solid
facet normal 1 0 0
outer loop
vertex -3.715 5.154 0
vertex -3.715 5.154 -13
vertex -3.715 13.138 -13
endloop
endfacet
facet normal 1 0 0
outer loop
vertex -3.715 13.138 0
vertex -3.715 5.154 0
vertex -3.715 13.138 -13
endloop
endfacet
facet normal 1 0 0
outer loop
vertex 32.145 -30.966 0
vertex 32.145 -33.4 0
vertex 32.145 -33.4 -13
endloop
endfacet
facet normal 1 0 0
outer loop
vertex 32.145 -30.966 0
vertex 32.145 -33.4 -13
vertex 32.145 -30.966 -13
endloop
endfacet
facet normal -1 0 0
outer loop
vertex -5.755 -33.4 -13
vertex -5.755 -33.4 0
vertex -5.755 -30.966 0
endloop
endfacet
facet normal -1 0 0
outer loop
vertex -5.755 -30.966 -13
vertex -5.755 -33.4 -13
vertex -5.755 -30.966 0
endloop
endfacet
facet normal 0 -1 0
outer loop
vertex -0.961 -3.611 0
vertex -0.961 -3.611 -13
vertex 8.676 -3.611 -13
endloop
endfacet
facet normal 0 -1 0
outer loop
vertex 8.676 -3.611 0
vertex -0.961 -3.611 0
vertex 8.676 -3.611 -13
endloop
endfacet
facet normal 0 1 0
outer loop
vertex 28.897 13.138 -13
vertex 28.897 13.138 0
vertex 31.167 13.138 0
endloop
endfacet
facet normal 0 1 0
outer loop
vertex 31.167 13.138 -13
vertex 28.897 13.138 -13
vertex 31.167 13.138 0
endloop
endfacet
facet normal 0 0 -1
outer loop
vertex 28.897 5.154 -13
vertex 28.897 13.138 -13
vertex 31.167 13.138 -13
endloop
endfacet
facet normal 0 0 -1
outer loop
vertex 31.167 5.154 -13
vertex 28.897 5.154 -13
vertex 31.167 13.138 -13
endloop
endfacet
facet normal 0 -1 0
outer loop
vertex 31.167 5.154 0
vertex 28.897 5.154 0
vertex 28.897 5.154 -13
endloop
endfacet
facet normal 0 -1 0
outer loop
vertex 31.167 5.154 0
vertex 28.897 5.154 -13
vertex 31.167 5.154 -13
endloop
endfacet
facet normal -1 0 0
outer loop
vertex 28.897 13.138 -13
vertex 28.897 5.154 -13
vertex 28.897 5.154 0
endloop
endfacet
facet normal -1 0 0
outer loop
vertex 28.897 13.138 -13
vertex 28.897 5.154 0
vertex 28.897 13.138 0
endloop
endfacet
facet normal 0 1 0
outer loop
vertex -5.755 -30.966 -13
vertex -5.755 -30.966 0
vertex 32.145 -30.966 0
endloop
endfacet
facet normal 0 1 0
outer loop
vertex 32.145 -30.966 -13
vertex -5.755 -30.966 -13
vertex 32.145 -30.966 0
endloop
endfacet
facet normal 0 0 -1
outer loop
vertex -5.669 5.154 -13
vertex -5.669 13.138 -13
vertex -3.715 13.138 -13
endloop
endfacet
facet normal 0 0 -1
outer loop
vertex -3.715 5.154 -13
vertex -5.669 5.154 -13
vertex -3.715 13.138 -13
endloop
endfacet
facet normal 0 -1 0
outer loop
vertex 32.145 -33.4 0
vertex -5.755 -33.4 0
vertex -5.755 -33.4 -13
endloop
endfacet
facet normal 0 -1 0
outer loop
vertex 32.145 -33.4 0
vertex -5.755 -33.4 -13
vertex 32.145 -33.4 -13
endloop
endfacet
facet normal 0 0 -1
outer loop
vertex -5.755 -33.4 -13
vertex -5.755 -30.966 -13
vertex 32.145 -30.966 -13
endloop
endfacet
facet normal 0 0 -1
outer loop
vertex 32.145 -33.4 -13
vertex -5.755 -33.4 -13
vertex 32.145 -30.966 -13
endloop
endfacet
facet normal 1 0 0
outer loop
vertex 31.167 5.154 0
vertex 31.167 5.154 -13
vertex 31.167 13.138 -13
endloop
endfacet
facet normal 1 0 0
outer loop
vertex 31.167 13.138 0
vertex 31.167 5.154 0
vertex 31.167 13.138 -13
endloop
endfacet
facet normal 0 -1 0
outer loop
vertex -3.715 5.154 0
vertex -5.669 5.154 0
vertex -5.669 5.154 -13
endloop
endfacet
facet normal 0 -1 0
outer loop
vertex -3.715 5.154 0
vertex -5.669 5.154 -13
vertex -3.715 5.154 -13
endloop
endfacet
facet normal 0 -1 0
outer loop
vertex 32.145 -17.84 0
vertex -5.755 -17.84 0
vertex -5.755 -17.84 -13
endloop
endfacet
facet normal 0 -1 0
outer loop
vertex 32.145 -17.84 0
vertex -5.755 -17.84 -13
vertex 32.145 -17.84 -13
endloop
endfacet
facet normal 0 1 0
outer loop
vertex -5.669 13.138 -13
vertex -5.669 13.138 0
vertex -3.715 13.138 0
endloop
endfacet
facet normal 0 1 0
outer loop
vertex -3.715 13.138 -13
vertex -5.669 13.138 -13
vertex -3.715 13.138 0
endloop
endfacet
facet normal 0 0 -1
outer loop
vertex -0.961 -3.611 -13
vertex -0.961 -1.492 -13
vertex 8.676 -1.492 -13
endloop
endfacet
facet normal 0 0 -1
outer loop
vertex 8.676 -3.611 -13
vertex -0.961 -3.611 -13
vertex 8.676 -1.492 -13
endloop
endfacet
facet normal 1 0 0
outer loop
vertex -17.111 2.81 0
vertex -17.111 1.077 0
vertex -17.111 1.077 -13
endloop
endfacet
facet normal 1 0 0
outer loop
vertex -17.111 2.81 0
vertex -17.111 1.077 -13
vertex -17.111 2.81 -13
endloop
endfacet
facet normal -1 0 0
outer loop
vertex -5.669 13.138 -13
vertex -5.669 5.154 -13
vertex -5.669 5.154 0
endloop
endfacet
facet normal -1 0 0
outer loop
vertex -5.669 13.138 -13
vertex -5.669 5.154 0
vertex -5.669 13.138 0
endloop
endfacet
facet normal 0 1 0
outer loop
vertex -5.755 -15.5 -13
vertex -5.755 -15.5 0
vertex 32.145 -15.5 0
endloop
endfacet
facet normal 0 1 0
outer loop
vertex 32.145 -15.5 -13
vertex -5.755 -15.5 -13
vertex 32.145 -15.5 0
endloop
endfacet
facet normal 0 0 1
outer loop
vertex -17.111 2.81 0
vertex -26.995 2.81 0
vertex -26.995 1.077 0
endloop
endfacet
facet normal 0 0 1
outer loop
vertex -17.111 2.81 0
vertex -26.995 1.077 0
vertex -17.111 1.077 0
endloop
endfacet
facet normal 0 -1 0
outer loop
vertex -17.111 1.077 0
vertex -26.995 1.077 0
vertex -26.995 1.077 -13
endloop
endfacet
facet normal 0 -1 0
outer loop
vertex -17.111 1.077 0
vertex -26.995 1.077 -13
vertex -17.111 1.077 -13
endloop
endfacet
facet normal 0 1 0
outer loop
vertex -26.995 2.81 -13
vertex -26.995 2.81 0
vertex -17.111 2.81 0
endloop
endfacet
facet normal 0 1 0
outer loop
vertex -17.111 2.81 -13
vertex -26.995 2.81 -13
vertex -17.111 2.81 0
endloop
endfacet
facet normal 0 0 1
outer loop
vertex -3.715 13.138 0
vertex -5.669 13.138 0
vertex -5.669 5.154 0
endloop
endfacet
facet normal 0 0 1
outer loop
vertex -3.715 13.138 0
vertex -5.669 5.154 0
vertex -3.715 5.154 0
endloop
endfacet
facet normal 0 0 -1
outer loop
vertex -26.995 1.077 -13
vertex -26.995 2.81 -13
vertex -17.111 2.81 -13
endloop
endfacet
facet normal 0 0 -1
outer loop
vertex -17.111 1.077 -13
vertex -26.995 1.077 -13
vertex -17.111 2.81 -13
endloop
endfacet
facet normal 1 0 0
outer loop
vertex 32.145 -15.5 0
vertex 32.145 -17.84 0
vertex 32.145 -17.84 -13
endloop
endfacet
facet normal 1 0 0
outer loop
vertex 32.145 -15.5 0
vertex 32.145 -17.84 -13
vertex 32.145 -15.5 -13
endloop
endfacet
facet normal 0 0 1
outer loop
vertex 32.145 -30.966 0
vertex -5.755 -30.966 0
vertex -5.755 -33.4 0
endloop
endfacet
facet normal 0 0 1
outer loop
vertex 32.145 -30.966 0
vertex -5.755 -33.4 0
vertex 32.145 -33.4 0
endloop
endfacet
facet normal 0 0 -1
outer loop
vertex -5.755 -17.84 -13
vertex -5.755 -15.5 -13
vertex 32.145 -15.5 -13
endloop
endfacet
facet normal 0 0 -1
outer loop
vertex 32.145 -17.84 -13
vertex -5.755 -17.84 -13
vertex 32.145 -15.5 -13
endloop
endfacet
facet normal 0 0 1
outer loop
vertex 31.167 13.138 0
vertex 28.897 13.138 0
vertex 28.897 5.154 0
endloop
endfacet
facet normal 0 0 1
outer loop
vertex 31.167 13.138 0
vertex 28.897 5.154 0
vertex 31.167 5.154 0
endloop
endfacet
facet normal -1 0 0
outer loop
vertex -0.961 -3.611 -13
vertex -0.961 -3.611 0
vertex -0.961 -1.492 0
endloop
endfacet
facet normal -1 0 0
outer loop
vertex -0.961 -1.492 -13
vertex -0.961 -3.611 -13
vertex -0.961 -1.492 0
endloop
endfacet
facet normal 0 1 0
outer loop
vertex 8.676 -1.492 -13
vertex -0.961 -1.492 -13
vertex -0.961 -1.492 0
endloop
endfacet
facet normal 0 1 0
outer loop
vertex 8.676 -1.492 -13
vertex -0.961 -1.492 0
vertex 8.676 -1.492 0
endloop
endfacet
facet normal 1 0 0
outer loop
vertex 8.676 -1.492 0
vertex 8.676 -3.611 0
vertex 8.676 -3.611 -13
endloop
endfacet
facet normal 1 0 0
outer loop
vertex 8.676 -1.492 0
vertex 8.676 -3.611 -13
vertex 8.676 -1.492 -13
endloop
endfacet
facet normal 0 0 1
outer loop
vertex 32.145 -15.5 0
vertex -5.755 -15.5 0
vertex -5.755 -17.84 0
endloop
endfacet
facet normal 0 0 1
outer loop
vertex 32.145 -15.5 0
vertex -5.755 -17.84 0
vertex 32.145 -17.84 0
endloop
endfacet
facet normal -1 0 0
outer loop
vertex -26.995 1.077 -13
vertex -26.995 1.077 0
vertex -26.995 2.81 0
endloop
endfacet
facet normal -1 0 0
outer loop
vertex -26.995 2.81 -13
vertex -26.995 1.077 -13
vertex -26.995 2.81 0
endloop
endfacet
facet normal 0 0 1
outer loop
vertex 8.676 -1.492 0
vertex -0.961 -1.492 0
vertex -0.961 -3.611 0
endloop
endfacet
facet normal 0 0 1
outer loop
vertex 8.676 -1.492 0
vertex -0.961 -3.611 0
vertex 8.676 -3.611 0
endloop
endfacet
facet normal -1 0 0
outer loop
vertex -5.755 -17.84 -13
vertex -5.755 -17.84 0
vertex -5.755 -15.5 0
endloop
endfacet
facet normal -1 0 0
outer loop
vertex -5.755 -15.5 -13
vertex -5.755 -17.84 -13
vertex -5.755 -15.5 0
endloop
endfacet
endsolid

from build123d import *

# Parameters (mm, degrees)
IZIM1_W                       = 9.63702019
IZIM1_H                       = 2.118777488
Y_KSEKLIK_EKSTR_ZYON1_DEPTH   = 13
IZIM1_W_2                     = 9.883488483
IZIM1_H_2                     = 1.732843856
Y_KSEKLIK_EKSTR_ZYON1_2_DEPTH = 13
IZIM1_W_3                     = 1.953921658
IZIM1_H_3                     = 7.983165628
Y_KSEKLIK_EKSTR_ZYON1_3_DEPTH = 13
IZIM1_W_4                     = 37.9
IZIM1_H_4                     = 2.34
Y_KSEKLIK_EKSTR_ZYON1_4_DEPTH = 13
IZIM1_W_5                     = 2.269294049
Y_KSEKLIK_EKSTR_ZYON1_5_DEPTH = 13
IZIM1_H_5                     = 2.43358359
Y_KSEKLIK_EKSTR_ZYON1_6_DEPTH = 13


with BuildPart() as part:
    # Çizim1 → Yükseklik-Ekstrüzyon1 (new body)
    with BuildSketch(Plane.XY):
        with Locations((3.857574093, -2.55176148)):
            Rectangle(IZIM1_W, IZIM1_H)
    extrude(amount=-Y_KSEKLIK_EKSTR_ZYON1_DEPTH)


with BuildPart() as body_2:
    # Çizim1 → Y_kseklik-Ekstr_zyon1 2 (new body)
    with BuildSketch(Plane.XY):
        with Locations((-22.053241935, 1.943207046)):
            Rectangle(IZIM1_W_2, IZIM1_H_2)
    extrude(amount=-Y_KSEKLIK_EKSTR_ZYON1_2_DEPTH)


with BuildPart() as body_3:
    # Çizim1 → Y_kseklik-Ekstr_zyon1 3 (new body)
    with BuildSketch(Plane.XY):
        with Locations((-4.692366118, 9.145917777)):
            Rectangle(IZIM1_W_3, IZIM1_H_3)
    extrude(amount=-Y_KSEKLIK_EKSTR_ZYON1_3_DEPTH)


with BuildPart() as body_4:
    # Çizim1 → Y_kseklik-Ekstr_zyon1 4 (new body)
    with BuildSketch(Plane.XY):
        with Locations((13.19451837, -16.67)):
            Rectangle(IZIM1_W_4, IZIM1_H_4)
    extrude(amount=-Y_KSEKLIK_EKSTR_ZYON1_4_DEPTH)


with BuildPart() as body_5:
    # Çizim1 → Y_kseklik-Ekstr_zyon1 5 (new body)
    with BuildSketch(Plane.XY):
        with Locations((30.031922134, 9.145917777)):
            Rectangle(IZIM1_W_5, IZIM1_H_3)
    extrude(amount=-Y_KSEKLIK_EKSTR_ZYON1_5_DEPTH)


with BuildPart() as body_6:
    # Çizim1 → Y_kseklik-Ekstr_zyon1 6 (new body)
    with BuildSketch(Plane.XY):
        with Locations((13.19451837, -32.183208205)):
            Rectangle(IZIM1_W_4, IZIM1_H_5)
    extrude(amount=-Y_KSEKLIK_EKSTR_ZYON1_6_DEPTH)


solid = Compound([part.part, body_2.part, body_3.part, body_4.part, body_5.part, body_6.part])
